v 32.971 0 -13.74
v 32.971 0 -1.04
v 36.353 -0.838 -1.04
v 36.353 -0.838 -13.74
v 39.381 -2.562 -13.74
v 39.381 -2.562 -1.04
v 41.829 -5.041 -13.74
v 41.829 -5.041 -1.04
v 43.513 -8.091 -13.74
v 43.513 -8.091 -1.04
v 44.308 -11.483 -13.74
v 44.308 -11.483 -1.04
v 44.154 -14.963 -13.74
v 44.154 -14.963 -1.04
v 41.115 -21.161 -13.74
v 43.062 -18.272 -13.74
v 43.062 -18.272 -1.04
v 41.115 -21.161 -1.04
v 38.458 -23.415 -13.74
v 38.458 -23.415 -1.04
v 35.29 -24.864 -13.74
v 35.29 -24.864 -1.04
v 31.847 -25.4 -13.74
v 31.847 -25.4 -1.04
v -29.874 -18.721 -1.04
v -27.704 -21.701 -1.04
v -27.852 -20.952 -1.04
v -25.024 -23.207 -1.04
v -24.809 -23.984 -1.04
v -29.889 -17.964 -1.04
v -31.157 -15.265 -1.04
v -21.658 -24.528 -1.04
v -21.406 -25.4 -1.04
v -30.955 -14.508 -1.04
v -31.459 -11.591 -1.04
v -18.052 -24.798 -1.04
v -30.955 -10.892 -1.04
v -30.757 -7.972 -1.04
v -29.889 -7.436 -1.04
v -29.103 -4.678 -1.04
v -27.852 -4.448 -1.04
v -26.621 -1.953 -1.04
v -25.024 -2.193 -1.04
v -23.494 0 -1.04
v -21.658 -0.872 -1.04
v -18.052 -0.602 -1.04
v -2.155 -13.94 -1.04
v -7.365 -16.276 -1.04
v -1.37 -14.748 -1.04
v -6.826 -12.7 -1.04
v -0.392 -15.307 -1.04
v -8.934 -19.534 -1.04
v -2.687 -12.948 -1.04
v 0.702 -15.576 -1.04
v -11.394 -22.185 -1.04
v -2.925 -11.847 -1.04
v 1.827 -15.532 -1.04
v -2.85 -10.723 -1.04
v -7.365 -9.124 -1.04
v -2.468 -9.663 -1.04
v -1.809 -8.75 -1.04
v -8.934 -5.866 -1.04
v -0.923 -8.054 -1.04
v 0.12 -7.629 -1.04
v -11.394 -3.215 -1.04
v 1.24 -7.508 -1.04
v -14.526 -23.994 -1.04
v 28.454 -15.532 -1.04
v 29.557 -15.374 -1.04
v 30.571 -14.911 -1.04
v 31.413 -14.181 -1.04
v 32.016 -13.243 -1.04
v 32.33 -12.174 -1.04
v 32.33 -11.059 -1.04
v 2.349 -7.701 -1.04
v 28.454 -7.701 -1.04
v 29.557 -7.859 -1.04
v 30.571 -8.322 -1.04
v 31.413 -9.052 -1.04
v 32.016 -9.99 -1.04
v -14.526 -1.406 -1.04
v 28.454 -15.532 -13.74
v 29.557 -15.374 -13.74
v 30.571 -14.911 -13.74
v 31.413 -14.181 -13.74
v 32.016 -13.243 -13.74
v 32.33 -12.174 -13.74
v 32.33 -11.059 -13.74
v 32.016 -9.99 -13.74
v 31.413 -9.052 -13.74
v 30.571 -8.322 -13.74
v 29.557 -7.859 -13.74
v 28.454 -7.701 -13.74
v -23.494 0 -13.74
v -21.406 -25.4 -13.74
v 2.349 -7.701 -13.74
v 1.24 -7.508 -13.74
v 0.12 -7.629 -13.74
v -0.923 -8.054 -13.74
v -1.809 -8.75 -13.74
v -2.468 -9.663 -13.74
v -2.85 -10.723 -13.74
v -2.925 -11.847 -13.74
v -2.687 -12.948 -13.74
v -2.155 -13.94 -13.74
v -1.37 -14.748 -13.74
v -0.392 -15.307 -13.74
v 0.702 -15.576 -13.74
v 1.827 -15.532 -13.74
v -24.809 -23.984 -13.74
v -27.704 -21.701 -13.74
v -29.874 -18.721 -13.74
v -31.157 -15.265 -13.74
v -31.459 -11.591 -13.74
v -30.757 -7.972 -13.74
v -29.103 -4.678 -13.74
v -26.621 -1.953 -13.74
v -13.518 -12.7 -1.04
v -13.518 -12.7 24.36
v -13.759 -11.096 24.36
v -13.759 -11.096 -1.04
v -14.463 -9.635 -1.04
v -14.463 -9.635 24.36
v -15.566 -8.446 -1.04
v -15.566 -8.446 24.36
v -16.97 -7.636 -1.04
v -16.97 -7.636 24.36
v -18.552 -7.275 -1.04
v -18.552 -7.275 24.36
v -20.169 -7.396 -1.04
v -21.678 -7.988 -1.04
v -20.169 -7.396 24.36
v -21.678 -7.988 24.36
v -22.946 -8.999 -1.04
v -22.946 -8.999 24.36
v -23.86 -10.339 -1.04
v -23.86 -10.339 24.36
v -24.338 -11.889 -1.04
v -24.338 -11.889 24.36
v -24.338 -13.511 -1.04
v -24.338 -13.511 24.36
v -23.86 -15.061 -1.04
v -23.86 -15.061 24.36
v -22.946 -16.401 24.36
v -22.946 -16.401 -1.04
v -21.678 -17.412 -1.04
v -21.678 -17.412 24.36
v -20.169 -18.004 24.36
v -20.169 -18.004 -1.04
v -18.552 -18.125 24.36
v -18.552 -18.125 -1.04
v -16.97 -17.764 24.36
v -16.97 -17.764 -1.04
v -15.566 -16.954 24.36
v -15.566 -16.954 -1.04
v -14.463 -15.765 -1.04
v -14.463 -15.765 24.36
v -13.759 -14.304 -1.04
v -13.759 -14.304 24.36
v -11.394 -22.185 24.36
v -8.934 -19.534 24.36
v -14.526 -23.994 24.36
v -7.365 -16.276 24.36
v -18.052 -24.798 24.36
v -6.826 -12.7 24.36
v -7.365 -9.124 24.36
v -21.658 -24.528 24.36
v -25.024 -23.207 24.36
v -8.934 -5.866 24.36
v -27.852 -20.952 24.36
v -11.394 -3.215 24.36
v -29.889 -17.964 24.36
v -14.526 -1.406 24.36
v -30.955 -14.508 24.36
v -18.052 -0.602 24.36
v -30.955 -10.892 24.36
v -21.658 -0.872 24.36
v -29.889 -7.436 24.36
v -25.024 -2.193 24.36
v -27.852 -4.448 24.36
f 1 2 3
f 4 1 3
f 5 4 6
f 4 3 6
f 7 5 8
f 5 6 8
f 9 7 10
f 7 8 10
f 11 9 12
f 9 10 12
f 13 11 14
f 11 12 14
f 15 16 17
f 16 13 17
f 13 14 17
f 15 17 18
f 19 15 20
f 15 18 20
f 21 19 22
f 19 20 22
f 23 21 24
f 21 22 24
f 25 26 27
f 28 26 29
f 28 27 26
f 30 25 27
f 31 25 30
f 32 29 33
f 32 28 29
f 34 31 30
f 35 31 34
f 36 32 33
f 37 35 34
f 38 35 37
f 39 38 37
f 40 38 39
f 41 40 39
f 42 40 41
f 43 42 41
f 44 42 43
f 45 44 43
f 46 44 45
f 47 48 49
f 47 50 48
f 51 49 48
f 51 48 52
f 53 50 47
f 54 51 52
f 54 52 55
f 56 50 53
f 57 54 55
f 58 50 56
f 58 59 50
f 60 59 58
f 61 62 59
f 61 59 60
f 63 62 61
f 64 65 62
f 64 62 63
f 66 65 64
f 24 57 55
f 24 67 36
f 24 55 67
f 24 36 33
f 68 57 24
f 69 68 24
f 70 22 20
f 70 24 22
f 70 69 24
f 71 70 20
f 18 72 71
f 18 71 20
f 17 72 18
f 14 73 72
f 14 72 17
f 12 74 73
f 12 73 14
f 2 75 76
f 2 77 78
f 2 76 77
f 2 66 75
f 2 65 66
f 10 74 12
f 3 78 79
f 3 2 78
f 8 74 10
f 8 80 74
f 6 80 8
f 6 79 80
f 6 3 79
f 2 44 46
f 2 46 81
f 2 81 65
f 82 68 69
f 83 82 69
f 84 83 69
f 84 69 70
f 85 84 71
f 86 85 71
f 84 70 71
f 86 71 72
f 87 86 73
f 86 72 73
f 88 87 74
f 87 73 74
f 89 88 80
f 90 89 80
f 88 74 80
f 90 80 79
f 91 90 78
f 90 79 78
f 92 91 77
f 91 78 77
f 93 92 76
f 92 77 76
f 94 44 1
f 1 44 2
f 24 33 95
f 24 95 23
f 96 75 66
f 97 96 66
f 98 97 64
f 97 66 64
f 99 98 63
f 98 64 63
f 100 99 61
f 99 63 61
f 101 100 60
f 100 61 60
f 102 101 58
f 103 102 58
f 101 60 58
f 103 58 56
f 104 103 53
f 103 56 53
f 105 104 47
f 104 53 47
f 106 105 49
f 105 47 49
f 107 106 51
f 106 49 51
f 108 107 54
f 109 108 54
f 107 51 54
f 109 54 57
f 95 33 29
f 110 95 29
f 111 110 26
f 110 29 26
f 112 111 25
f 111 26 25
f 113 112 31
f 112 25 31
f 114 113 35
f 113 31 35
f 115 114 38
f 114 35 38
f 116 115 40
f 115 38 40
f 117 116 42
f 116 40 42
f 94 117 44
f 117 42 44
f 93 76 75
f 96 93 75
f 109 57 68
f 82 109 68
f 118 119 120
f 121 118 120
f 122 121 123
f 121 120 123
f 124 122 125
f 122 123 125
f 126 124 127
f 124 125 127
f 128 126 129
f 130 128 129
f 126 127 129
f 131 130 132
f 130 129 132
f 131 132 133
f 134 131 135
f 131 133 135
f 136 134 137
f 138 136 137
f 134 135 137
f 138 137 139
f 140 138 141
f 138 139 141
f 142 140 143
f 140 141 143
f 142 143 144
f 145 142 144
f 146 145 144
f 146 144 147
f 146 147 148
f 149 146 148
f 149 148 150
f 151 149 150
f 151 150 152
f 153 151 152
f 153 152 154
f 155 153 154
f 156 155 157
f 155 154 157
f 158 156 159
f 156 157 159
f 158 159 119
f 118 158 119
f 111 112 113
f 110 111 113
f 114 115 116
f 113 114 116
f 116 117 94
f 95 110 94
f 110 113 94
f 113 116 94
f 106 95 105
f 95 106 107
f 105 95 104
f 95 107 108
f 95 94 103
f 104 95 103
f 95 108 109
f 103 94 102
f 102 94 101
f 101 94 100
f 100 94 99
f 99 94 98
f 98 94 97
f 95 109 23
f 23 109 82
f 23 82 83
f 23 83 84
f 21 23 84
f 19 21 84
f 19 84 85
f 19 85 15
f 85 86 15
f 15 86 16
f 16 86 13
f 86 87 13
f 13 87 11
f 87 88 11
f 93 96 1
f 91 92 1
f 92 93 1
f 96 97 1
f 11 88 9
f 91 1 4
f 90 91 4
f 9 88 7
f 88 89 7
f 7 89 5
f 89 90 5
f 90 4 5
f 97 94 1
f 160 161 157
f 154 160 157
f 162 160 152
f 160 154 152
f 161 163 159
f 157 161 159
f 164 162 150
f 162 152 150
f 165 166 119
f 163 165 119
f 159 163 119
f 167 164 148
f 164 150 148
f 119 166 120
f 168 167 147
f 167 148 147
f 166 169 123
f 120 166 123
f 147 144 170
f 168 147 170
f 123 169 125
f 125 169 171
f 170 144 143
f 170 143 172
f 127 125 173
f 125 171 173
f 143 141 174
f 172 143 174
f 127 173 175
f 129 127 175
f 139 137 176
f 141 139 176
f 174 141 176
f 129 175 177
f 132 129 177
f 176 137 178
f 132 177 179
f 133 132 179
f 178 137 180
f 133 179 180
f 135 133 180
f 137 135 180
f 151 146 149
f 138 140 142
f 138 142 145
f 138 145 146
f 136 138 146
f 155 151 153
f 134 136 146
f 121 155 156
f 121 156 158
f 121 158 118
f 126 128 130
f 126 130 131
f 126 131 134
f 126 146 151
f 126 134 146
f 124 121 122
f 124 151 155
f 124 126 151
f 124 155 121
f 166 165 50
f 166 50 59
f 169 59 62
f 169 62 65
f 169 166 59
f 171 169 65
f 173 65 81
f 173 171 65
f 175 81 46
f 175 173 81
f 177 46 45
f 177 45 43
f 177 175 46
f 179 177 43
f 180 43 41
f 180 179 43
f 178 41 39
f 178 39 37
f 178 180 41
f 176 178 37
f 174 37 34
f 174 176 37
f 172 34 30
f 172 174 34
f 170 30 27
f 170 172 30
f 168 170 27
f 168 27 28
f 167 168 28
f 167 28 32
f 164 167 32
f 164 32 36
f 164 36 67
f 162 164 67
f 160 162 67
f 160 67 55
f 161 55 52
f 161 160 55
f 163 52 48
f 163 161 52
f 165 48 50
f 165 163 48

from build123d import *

# Parameters (mm, degrees)
F1_DEPTH = 25.4
F3_DEPTH = 25.4
F4_W     = 25.4
F4_H     = 25.4
F4_R     = 12.132292
F4_R_2   = 5.440565
F5_DEPTH = 25.4
F7_DEPTH = 25.4
F9_DEPTH = 25.4


with BuildPart() as f1:
    # F0 (on Front) → F1 (new body)
    with BuildSketch(Plane.XZ):
        Polygon((-6.258154, 24.359922), (-31.658154, 24.359922), (-31.658154, -13.740078), (44.541846, -13.740078), (44.541846, -1.040078), (-6.258154, -1.040078), align=None)
    extrude(amount=F1_DEPTH)

    # F2 (on face) → F3 (cut)
    with BuildSketch(Plane.XY.offset(-1.040078)):
        with BuildLine():
            ThreePointArc((32.971398, 0), (44.350376, -13.228424), (31.847373, -25.4))
            Line((31.847373, -25.4), (44.541846, -25.4))
            Line((44.541846, -25.4), (44.541846, 0))
            Line((44.541846, 0), (32.971398, 0))
        make_face()
    extrude(amount=-F3_DEPTH, mode=Mode.SUBTRACT)

    # F4 (on face) → F5 (cut)
    with BuildSketch(Plane.XY.offset(24.359922)):
        with Locations((-18.958154, -12.7)):
            Rectangle(F4_W, F4_H)
        with Locations((-18.958154, -12.7)):
            Circle(F4_R, mode=Mode.SUBTRACT)
        with Locations((-18.958154, -12.7)):
            Circle(F4_R_2)
    extrude(amount=-F5_DEPTH, mode=Mode.SUBTRACT)

    # F6 (on face) → F7 (cut)
    with BuildSketch(Plane.XY.offset(-1.040078)):
        with BuildLine():
            Line((-23.493964, 0), (-31.658154, 0))
            Line((-31.658154, 0), (-31.658154, -25.4))
            Line((-31.658154, -25.4), (-21.405611, -25.4))
            ThreePointArc((-21.405611, -25.4), (-31.43432, -13.438696), (-23.493964, 0))
        make_face()
    extrude(amount=-F7_DEPTH, mode=Mode.SUBTRACT)

    # F8 (on face) → F9 (cut)
    with BuildSketch(Plane.XY.offset(-1.040078)):
        with BuildLine():
            Line((28.453799, -7.700799), (2.349396, -7.700799))
            ThreePointArc((2.349396, -7.700799), (-2.926734, -11.282122), (1.827309, -15.532121))
            Line((1.827309, -15.532121), (28.453799, -15.532121))
            ThreePointArc((28.453799, -15.532121), (32.36946, -11.61646), (28.453799, -7.700799))
        make_face()
    extrude(amount=-F9_DEPTH, mode=Mode.SUBTRACT)


solid = f1.part
